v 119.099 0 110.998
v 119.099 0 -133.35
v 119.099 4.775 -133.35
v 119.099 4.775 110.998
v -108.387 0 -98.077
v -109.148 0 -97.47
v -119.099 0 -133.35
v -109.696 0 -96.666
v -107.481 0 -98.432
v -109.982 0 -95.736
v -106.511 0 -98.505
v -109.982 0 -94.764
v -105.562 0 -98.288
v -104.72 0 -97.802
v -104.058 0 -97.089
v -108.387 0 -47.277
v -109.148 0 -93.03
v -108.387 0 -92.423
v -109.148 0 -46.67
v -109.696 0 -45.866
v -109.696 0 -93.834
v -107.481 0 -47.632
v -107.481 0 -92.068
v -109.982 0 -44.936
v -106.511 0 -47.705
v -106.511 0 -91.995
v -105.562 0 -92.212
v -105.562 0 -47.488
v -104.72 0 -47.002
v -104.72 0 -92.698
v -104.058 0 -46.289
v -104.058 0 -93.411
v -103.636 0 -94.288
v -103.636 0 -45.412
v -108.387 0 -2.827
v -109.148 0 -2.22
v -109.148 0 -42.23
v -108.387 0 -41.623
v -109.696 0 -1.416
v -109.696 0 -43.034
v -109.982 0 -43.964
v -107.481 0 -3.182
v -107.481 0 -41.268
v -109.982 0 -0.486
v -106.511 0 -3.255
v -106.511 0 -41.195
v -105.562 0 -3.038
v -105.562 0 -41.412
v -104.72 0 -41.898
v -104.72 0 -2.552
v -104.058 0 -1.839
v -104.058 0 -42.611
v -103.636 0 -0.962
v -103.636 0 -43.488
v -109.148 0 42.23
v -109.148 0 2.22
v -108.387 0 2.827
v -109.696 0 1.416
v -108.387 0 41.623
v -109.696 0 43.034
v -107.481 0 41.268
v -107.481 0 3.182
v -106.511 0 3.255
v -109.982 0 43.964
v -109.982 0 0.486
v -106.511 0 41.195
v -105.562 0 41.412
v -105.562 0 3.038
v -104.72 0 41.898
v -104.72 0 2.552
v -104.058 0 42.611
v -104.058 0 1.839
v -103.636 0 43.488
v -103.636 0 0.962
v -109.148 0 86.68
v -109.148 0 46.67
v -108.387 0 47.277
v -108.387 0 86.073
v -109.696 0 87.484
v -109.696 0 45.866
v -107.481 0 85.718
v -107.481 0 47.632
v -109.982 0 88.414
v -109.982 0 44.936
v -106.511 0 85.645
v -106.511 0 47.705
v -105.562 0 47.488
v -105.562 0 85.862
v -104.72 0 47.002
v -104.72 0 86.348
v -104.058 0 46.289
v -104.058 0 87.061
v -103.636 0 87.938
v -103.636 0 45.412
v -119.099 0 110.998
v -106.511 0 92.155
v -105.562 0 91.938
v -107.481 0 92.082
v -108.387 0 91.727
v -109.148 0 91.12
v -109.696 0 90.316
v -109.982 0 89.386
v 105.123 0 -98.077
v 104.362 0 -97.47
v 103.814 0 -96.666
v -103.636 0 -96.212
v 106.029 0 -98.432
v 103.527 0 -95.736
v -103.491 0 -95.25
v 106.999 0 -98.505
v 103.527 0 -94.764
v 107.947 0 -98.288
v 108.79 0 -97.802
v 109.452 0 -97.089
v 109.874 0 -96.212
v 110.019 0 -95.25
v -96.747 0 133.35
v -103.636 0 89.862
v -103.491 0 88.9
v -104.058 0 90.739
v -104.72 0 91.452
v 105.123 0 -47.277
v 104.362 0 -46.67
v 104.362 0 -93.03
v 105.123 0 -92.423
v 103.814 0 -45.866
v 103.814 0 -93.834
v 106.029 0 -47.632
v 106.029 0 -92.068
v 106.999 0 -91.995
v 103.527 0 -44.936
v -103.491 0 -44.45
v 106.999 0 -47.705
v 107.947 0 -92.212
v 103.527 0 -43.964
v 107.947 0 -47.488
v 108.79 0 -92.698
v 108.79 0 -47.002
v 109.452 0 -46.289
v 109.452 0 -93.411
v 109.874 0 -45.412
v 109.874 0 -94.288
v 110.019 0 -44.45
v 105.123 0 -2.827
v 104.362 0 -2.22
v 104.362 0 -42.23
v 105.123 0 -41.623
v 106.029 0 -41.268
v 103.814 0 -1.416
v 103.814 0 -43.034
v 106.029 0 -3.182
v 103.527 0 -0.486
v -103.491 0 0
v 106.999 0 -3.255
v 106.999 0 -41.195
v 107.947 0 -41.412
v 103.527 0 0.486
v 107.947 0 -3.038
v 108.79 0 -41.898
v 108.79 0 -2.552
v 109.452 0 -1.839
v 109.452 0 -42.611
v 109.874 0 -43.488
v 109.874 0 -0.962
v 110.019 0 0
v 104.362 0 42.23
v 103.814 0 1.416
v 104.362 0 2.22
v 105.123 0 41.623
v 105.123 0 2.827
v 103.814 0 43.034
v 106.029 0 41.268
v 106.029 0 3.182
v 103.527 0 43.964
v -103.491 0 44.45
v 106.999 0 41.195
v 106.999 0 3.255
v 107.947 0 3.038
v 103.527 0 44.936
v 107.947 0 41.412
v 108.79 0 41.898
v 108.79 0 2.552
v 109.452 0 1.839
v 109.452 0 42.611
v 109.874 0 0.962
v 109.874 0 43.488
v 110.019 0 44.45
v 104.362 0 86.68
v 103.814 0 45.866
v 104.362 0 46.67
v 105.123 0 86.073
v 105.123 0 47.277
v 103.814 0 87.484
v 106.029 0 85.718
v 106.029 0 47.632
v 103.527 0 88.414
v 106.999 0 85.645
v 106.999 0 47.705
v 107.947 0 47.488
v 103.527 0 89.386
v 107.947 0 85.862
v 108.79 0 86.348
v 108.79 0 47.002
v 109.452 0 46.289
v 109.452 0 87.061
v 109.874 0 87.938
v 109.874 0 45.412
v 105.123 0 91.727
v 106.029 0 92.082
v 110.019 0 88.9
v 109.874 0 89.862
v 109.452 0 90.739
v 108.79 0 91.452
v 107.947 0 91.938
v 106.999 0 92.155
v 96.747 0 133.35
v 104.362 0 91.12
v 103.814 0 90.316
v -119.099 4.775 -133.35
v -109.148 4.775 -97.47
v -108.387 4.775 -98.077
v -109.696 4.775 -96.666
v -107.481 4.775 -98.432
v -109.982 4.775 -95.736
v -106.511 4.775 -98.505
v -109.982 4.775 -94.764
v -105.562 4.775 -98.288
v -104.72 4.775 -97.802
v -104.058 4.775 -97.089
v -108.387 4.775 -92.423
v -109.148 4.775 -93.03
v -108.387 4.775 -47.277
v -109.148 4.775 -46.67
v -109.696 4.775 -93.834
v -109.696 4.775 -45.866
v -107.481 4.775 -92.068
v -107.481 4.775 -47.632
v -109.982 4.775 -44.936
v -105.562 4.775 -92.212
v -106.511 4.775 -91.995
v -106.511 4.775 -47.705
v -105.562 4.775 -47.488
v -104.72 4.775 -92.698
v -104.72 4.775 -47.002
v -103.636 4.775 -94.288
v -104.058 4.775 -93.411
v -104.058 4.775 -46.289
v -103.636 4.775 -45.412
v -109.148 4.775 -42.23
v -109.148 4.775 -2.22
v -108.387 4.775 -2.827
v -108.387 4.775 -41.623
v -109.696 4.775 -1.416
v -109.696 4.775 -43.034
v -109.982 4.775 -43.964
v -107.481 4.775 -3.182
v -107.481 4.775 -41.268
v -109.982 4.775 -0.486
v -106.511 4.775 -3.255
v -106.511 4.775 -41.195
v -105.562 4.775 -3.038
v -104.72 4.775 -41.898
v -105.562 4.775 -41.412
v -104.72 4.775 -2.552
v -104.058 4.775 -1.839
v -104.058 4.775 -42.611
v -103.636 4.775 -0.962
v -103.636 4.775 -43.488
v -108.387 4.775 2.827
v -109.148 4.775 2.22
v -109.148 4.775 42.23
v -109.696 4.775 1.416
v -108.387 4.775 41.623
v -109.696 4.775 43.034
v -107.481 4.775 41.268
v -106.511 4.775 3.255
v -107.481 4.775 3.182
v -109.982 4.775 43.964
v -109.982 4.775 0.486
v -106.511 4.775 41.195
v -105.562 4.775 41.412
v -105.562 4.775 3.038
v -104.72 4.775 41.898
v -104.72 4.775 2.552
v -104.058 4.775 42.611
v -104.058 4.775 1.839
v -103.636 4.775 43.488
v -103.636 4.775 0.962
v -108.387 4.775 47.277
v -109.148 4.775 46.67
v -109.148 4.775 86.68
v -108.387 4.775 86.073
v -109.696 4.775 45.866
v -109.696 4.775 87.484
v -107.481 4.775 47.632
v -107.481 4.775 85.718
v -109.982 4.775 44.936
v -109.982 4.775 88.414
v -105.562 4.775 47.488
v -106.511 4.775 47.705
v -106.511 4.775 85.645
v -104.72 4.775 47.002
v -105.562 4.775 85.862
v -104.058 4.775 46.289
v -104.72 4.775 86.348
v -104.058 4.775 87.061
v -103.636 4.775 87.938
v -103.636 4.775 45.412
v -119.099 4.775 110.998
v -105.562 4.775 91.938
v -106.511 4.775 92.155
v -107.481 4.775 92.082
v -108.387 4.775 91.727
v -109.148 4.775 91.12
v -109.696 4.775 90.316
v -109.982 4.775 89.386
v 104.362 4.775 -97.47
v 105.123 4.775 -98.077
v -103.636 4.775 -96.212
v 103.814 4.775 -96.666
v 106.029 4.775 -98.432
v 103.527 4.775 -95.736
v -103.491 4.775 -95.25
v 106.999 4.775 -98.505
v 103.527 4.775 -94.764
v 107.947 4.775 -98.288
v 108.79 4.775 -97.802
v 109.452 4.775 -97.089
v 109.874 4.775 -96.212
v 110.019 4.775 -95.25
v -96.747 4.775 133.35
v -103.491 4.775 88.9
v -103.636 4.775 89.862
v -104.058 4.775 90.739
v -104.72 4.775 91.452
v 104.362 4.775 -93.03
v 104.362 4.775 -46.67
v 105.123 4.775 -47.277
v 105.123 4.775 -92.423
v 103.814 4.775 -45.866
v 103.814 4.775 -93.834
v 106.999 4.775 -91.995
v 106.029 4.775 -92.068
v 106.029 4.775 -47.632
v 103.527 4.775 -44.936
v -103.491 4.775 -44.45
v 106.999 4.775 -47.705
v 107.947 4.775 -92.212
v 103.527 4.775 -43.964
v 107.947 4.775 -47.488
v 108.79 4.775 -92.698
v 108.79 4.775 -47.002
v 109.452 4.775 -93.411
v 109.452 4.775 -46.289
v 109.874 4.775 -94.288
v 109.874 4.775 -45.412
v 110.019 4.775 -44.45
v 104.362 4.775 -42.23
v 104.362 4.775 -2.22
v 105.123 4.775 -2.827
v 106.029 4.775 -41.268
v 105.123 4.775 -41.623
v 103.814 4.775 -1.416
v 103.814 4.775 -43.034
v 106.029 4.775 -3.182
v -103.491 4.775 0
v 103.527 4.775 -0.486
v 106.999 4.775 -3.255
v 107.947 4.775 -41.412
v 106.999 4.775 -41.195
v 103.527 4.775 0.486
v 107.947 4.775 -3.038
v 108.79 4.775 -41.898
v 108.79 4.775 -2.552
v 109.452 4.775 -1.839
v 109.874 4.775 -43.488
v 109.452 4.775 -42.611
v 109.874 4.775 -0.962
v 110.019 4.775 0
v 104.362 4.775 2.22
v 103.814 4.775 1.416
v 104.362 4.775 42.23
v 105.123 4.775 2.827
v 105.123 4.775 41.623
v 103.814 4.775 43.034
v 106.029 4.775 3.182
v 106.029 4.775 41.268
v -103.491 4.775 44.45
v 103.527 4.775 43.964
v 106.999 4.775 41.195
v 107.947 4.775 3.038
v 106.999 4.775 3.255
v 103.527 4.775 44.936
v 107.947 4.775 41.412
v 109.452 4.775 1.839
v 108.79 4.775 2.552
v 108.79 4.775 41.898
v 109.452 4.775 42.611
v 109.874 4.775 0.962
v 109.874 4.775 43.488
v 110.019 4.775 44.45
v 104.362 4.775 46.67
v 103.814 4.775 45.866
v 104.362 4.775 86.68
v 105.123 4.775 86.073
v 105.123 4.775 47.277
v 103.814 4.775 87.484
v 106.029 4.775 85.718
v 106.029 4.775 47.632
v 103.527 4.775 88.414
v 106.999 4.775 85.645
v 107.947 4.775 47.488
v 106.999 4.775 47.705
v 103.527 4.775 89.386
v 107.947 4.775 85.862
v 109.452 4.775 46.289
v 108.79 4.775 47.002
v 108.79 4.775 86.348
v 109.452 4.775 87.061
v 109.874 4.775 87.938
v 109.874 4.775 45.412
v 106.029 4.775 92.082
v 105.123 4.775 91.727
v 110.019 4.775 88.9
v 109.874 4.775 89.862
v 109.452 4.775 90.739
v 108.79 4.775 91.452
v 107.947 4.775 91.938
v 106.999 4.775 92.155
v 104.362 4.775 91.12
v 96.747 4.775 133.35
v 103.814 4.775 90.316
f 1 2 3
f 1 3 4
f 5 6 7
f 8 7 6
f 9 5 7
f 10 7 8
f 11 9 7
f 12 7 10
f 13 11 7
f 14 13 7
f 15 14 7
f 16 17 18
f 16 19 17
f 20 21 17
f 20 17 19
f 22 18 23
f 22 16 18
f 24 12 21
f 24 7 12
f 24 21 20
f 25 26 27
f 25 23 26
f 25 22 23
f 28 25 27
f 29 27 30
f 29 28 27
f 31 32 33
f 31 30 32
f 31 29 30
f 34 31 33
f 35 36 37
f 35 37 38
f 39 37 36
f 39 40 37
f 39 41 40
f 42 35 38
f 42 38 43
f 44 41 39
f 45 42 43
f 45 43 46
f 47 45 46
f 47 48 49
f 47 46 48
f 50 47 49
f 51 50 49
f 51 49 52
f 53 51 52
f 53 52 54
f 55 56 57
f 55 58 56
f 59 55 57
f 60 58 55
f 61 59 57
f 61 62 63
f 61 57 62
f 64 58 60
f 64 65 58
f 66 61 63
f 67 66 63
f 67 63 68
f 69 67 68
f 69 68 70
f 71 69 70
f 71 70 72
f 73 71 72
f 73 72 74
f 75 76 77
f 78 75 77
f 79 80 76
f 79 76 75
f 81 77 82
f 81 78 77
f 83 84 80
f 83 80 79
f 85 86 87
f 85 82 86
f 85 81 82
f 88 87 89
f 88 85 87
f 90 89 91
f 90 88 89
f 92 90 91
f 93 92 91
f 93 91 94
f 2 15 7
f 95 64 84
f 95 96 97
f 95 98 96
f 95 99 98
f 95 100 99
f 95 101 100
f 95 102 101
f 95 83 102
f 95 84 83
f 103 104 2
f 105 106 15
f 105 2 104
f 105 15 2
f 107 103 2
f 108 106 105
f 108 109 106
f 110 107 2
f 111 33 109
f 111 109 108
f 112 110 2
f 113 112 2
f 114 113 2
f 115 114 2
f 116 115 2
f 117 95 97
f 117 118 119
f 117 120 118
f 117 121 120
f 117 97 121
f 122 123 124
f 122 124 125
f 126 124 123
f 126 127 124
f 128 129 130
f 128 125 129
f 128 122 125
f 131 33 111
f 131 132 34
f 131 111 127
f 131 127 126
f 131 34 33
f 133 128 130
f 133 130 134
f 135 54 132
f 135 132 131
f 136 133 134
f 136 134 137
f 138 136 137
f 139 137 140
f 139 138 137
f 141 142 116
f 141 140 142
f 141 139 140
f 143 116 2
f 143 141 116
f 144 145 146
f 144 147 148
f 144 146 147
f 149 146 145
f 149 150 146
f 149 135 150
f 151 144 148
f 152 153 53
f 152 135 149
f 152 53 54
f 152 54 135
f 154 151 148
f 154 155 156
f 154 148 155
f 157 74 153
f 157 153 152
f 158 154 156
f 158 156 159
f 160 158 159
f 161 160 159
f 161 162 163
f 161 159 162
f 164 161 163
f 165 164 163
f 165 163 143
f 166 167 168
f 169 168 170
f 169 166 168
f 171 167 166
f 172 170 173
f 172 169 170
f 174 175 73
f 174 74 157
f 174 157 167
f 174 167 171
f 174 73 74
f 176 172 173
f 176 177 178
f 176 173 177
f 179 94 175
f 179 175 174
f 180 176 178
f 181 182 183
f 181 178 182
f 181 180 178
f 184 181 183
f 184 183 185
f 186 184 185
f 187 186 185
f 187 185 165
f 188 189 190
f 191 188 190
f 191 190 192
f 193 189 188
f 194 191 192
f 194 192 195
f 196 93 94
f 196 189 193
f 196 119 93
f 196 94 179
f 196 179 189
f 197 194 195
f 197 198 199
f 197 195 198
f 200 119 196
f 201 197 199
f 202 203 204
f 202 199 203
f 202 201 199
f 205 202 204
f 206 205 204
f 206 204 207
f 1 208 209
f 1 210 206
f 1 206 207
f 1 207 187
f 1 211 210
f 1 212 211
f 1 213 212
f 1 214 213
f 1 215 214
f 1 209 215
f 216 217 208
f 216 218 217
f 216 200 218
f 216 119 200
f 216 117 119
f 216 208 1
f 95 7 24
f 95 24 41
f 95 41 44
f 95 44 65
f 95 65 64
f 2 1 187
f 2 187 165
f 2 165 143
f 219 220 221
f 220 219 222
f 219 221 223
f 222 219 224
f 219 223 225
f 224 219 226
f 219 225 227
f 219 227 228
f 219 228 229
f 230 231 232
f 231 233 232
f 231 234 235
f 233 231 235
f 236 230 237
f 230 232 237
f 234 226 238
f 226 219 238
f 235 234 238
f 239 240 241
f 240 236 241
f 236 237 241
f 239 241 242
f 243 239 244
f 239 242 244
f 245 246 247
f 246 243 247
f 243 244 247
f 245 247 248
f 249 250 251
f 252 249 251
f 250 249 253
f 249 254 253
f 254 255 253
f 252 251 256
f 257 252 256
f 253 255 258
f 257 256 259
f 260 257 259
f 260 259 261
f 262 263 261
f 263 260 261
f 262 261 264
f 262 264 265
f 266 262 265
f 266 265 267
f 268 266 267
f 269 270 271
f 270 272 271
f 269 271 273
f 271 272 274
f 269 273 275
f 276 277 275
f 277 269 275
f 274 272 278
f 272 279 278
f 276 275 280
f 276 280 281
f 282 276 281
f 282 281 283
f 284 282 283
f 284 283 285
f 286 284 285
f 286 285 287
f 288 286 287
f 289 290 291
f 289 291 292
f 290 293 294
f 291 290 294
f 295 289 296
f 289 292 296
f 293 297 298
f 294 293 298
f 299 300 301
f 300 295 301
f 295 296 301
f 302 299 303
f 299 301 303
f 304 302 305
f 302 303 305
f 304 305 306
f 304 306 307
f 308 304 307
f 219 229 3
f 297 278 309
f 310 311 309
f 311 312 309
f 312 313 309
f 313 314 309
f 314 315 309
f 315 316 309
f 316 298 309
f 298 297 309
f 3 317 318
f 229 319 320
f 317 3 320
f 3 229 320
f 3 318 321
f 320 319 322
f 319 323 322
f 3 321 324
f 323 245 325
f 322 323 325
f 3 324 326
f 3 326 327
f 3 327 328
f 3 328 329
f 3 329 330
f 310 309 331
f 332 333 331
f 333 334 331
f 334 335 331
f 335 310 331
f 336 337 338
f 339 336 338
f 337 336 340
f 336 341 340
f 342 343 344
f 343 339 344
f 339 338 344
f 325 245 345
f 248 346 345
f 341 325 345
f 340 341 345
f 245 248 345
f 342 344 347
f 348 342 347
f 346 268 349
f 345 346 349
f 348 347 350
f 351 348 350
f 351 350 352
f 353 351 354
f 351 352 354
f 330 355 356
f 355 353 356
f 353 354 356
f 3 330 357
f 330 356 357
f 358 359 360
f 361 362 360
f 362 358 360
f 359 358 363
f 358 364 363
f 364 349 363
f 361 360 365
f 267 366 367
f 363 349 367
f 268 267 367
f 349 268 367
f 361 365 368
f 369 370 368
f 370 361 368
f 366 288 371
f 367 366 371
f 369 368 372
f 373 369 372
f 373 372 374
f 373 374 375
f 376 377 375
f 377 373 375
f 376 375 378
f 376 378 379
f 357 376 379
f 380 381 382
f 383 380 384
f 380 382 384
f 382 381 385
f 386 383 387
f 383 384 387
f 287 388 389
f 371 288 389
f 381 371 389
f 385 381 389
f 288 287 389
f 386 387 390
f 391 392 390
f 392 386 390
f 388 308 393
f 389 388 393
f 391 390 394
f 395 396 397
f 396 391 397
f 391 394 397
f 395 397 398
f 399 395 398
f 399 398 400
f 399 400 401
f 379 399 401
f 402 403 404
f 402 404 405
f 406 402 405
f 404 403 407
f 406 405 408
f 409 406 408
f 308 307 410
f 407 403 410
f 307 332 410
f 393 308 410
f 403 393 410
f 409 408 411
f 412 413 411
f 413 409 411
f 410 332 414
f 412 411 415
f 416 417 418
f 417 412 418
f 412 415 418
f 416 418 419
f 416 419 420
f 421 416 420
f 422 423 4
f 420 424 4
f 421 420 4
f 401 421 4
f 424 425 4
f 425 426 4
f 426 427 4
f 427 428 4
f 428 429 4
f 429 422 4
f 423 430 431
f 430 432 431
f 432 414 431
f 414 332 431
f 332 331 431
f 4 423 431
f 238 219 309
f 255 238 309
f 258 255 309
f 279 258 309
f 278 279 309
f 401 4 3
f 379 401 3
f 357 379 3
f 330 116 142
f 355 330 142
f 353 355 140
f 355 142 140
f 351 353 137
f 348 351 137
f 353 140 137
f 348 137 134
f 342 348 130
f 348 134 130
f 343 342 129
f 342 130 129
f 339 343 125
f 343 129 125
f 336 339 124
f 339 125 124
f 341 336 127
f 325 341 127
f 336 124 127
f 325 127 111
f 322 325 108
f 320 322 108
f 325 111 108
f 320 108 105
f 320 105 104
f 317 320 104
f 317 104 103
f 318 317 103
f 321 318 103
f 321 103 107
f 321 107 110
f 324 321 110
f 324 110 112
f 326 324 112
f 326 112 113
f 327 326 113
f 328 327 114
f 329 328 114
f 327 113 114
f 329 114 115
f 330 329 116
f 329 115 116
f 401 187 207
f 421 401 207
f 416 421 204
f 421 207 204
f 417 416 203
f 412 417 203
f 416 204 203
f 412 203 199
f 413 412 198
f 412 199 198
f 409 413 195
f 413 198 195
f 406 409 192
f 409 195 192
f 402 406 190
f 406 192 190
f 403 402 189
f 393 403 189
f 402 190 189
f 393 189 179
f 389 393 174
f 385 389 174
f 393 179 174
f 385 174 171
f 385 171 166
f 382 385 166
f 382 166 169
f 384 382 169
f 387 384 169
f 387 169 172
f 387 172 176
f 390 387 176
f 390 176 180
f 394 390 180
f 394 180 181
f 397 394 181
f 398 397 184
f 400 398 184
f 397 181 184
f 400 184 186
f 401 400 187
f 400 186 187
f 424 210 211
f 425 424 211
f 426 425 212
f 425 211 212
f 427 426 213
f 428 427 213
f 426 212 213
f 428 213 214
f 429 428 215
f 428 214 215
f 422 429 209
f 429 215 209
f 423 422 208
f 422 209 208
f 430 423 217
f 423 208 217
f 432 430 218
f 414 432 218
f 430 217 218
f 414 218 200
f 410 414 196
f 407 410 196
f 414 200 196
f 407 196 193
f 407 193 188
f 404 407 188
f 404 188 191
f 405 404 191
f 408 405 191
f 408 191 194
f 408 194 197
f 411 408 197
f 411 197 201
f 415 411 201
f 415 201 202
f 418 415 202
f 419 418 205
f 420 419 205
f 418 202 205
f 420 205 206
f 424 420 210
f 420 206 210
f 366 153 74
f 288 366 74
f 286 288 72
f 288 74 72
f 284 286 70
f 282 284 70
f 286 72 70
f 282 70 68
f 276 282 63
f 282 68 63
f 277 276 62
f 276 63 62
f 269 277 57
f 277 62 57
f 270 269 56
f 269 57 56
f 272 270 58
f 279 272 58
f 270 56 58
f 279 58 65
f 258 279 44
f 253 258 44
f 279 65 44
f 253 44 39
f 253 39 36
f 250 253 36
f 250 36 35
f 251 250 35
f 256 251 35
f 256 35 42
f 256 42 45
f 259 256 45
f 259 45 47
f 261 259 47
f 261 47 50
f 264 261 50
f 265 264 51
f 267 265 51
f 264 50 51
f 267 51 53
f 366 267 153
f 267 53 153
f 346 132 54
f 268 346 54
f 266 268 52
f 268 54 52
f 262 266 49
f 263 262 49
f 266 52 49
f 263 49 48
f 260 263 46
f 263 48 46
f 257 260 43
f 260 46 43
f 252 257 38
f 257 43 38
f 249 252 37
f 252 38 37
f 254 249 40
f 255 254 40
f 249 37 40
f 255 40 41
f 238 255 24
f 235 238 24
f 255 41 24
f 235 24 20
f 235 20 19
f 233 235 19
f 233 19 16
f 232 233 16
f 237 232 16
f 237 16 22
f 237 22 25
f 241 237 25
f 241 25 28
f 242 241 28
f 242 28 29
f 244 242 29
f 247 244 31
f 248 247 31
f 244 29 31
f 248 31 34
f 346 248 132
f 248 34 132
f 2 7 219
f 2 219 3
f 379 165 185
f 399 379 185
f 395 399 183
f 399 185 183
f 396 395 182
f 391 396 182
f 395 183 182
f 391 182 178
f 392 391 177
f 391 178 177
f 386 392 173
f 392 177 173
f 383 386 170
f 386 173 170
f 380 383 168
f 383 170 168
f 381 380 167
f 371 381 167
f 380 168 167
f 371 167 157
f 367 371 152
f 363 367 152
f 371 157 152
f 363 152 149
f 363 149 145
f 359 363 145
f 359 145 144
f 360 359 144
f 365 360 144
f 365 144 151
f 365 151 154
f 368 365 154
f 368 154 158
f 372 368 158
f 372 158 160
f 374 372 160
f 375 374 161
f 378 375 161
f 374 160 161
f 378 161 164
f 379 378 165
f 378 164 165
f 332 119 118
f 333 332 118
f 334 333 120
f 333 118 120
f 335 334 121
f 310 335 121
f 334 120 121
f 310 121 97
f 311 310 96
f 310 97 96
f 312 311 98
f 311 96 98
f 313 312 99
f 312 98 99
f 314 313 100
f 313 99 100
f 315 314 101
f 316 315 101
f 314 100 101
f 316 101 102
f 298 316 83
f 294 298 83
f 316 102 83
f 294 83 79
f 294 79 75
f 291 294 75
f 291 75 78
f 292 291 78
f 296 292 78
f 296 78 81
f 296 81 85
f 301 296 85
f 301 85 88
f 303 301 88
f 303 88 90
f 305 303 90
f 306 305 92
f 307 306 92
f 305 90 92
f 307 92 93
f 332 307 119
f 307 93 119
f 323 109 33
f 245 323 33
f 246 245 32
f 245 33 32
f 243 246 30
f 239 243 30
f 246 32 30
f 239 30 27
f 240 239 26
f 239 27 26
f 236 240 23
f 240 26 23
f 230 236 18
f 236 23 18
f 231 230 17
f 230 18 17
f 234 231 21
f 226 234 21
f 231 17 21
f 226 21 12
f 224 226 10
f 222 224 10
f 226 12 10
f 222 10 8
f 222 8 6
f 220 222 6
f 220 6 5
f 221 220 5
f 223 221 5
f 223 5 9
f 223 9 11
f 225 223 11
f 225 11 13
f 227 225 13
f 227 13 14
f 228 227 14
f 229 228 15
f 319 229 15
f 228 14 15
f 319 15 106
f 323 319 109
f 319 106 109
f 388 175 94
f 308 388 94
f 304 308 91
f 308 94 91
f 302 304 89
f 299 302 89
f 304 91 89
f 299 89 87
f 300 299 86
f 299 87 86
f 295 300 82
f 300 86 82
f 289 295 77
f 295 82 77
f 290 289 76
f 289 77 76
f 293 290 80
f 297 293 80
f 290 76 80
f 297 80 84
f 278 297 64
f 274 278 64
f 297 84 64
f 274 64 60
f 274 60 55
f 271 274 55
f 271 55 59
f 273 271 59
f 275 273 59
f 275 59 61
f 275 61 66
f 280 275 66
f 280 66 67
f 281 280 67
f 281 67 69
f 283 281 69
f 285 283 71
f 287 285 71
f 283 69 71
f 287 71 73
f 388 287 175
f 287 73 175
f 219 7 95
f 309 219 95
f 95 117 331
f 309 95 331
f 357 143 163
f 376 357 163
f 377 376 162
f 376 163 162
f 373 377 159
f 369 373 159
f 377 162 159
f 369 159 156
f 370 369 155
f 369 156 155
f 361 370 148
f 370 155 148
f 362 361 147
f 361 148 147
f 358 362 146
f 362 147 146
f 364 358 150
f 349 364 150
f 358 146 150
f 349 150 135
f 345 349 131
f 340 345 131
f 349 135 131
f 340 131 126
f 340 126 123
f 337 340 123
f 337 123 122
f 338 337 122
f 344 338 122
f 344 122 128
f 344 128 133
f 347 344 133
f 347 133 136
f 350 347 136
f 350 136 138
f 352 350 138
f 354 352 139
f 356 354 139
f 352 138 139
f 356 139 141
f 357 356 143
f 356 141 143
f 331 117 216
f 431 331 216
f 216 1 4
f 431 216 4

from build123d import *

# Parameters (mm, degrees)
F0_W     = 238.19866
F0_H     = 266.7
F0_R     = 3.2639
F1_DEPTH = 4.7752
F2_SIZE  = 22.352


with BuildPart() as f1:
    # F0 (on Front) → F1 (new body)
    with BuildSketch(Plane.XZ):
        Rectangle(F0_W, F0_H)
        with Locations((-106.75493, -95.25)):
            Circle(F0_R, mode=Mode.SUBTRACT)
        with Locations((-106.75493, -44.45)):
            Circle(F0_R, mode=Mode.SUBTRACT)
        with Locations((106.75493, -95.25)):
            Circle(F0_R, mode=Mode.SUBTRACT)
        with Locations((106.75493, -44.45)):
            Circle(F0_R, mode=Mode.SUBTRACT)
        with Locations((-106.75493, 0)):
            Circle(F0_R, mode=Mode.SUBTRACT)
        with Locations((-106.75493, 44.45)):
            Circle(F0_R, mode=Mode.SUBTRACT)
        with Locations((-106.75493, 88.9)):
            Circle(F0_R, mode=Mode.SUBTRACT)
        with Locations((106.75493, 0)):
            Circle(F0_R, mode=Mode.SUBTRACT)
        with Locations((106.75493, 44.45)):
            Circle(F0_R, mode=Mode.SUBTRACT)
        with Locations((106.75493, 88.9)):
            Circle(F0_R, mode=Mode.SUBTRACT)
    extrude(amount=-F1_DEPTH)

    # F2
    f2_edges = [f1.edges().sort_by_distance(p)[0] for p in [
        (119.09933, 2.3876, 133.35),
        (-119.09933, 2.3876, 133.35),
    ]]
    chamfer(f2_edges, length=F2_SIZE)


solid = f1.part
